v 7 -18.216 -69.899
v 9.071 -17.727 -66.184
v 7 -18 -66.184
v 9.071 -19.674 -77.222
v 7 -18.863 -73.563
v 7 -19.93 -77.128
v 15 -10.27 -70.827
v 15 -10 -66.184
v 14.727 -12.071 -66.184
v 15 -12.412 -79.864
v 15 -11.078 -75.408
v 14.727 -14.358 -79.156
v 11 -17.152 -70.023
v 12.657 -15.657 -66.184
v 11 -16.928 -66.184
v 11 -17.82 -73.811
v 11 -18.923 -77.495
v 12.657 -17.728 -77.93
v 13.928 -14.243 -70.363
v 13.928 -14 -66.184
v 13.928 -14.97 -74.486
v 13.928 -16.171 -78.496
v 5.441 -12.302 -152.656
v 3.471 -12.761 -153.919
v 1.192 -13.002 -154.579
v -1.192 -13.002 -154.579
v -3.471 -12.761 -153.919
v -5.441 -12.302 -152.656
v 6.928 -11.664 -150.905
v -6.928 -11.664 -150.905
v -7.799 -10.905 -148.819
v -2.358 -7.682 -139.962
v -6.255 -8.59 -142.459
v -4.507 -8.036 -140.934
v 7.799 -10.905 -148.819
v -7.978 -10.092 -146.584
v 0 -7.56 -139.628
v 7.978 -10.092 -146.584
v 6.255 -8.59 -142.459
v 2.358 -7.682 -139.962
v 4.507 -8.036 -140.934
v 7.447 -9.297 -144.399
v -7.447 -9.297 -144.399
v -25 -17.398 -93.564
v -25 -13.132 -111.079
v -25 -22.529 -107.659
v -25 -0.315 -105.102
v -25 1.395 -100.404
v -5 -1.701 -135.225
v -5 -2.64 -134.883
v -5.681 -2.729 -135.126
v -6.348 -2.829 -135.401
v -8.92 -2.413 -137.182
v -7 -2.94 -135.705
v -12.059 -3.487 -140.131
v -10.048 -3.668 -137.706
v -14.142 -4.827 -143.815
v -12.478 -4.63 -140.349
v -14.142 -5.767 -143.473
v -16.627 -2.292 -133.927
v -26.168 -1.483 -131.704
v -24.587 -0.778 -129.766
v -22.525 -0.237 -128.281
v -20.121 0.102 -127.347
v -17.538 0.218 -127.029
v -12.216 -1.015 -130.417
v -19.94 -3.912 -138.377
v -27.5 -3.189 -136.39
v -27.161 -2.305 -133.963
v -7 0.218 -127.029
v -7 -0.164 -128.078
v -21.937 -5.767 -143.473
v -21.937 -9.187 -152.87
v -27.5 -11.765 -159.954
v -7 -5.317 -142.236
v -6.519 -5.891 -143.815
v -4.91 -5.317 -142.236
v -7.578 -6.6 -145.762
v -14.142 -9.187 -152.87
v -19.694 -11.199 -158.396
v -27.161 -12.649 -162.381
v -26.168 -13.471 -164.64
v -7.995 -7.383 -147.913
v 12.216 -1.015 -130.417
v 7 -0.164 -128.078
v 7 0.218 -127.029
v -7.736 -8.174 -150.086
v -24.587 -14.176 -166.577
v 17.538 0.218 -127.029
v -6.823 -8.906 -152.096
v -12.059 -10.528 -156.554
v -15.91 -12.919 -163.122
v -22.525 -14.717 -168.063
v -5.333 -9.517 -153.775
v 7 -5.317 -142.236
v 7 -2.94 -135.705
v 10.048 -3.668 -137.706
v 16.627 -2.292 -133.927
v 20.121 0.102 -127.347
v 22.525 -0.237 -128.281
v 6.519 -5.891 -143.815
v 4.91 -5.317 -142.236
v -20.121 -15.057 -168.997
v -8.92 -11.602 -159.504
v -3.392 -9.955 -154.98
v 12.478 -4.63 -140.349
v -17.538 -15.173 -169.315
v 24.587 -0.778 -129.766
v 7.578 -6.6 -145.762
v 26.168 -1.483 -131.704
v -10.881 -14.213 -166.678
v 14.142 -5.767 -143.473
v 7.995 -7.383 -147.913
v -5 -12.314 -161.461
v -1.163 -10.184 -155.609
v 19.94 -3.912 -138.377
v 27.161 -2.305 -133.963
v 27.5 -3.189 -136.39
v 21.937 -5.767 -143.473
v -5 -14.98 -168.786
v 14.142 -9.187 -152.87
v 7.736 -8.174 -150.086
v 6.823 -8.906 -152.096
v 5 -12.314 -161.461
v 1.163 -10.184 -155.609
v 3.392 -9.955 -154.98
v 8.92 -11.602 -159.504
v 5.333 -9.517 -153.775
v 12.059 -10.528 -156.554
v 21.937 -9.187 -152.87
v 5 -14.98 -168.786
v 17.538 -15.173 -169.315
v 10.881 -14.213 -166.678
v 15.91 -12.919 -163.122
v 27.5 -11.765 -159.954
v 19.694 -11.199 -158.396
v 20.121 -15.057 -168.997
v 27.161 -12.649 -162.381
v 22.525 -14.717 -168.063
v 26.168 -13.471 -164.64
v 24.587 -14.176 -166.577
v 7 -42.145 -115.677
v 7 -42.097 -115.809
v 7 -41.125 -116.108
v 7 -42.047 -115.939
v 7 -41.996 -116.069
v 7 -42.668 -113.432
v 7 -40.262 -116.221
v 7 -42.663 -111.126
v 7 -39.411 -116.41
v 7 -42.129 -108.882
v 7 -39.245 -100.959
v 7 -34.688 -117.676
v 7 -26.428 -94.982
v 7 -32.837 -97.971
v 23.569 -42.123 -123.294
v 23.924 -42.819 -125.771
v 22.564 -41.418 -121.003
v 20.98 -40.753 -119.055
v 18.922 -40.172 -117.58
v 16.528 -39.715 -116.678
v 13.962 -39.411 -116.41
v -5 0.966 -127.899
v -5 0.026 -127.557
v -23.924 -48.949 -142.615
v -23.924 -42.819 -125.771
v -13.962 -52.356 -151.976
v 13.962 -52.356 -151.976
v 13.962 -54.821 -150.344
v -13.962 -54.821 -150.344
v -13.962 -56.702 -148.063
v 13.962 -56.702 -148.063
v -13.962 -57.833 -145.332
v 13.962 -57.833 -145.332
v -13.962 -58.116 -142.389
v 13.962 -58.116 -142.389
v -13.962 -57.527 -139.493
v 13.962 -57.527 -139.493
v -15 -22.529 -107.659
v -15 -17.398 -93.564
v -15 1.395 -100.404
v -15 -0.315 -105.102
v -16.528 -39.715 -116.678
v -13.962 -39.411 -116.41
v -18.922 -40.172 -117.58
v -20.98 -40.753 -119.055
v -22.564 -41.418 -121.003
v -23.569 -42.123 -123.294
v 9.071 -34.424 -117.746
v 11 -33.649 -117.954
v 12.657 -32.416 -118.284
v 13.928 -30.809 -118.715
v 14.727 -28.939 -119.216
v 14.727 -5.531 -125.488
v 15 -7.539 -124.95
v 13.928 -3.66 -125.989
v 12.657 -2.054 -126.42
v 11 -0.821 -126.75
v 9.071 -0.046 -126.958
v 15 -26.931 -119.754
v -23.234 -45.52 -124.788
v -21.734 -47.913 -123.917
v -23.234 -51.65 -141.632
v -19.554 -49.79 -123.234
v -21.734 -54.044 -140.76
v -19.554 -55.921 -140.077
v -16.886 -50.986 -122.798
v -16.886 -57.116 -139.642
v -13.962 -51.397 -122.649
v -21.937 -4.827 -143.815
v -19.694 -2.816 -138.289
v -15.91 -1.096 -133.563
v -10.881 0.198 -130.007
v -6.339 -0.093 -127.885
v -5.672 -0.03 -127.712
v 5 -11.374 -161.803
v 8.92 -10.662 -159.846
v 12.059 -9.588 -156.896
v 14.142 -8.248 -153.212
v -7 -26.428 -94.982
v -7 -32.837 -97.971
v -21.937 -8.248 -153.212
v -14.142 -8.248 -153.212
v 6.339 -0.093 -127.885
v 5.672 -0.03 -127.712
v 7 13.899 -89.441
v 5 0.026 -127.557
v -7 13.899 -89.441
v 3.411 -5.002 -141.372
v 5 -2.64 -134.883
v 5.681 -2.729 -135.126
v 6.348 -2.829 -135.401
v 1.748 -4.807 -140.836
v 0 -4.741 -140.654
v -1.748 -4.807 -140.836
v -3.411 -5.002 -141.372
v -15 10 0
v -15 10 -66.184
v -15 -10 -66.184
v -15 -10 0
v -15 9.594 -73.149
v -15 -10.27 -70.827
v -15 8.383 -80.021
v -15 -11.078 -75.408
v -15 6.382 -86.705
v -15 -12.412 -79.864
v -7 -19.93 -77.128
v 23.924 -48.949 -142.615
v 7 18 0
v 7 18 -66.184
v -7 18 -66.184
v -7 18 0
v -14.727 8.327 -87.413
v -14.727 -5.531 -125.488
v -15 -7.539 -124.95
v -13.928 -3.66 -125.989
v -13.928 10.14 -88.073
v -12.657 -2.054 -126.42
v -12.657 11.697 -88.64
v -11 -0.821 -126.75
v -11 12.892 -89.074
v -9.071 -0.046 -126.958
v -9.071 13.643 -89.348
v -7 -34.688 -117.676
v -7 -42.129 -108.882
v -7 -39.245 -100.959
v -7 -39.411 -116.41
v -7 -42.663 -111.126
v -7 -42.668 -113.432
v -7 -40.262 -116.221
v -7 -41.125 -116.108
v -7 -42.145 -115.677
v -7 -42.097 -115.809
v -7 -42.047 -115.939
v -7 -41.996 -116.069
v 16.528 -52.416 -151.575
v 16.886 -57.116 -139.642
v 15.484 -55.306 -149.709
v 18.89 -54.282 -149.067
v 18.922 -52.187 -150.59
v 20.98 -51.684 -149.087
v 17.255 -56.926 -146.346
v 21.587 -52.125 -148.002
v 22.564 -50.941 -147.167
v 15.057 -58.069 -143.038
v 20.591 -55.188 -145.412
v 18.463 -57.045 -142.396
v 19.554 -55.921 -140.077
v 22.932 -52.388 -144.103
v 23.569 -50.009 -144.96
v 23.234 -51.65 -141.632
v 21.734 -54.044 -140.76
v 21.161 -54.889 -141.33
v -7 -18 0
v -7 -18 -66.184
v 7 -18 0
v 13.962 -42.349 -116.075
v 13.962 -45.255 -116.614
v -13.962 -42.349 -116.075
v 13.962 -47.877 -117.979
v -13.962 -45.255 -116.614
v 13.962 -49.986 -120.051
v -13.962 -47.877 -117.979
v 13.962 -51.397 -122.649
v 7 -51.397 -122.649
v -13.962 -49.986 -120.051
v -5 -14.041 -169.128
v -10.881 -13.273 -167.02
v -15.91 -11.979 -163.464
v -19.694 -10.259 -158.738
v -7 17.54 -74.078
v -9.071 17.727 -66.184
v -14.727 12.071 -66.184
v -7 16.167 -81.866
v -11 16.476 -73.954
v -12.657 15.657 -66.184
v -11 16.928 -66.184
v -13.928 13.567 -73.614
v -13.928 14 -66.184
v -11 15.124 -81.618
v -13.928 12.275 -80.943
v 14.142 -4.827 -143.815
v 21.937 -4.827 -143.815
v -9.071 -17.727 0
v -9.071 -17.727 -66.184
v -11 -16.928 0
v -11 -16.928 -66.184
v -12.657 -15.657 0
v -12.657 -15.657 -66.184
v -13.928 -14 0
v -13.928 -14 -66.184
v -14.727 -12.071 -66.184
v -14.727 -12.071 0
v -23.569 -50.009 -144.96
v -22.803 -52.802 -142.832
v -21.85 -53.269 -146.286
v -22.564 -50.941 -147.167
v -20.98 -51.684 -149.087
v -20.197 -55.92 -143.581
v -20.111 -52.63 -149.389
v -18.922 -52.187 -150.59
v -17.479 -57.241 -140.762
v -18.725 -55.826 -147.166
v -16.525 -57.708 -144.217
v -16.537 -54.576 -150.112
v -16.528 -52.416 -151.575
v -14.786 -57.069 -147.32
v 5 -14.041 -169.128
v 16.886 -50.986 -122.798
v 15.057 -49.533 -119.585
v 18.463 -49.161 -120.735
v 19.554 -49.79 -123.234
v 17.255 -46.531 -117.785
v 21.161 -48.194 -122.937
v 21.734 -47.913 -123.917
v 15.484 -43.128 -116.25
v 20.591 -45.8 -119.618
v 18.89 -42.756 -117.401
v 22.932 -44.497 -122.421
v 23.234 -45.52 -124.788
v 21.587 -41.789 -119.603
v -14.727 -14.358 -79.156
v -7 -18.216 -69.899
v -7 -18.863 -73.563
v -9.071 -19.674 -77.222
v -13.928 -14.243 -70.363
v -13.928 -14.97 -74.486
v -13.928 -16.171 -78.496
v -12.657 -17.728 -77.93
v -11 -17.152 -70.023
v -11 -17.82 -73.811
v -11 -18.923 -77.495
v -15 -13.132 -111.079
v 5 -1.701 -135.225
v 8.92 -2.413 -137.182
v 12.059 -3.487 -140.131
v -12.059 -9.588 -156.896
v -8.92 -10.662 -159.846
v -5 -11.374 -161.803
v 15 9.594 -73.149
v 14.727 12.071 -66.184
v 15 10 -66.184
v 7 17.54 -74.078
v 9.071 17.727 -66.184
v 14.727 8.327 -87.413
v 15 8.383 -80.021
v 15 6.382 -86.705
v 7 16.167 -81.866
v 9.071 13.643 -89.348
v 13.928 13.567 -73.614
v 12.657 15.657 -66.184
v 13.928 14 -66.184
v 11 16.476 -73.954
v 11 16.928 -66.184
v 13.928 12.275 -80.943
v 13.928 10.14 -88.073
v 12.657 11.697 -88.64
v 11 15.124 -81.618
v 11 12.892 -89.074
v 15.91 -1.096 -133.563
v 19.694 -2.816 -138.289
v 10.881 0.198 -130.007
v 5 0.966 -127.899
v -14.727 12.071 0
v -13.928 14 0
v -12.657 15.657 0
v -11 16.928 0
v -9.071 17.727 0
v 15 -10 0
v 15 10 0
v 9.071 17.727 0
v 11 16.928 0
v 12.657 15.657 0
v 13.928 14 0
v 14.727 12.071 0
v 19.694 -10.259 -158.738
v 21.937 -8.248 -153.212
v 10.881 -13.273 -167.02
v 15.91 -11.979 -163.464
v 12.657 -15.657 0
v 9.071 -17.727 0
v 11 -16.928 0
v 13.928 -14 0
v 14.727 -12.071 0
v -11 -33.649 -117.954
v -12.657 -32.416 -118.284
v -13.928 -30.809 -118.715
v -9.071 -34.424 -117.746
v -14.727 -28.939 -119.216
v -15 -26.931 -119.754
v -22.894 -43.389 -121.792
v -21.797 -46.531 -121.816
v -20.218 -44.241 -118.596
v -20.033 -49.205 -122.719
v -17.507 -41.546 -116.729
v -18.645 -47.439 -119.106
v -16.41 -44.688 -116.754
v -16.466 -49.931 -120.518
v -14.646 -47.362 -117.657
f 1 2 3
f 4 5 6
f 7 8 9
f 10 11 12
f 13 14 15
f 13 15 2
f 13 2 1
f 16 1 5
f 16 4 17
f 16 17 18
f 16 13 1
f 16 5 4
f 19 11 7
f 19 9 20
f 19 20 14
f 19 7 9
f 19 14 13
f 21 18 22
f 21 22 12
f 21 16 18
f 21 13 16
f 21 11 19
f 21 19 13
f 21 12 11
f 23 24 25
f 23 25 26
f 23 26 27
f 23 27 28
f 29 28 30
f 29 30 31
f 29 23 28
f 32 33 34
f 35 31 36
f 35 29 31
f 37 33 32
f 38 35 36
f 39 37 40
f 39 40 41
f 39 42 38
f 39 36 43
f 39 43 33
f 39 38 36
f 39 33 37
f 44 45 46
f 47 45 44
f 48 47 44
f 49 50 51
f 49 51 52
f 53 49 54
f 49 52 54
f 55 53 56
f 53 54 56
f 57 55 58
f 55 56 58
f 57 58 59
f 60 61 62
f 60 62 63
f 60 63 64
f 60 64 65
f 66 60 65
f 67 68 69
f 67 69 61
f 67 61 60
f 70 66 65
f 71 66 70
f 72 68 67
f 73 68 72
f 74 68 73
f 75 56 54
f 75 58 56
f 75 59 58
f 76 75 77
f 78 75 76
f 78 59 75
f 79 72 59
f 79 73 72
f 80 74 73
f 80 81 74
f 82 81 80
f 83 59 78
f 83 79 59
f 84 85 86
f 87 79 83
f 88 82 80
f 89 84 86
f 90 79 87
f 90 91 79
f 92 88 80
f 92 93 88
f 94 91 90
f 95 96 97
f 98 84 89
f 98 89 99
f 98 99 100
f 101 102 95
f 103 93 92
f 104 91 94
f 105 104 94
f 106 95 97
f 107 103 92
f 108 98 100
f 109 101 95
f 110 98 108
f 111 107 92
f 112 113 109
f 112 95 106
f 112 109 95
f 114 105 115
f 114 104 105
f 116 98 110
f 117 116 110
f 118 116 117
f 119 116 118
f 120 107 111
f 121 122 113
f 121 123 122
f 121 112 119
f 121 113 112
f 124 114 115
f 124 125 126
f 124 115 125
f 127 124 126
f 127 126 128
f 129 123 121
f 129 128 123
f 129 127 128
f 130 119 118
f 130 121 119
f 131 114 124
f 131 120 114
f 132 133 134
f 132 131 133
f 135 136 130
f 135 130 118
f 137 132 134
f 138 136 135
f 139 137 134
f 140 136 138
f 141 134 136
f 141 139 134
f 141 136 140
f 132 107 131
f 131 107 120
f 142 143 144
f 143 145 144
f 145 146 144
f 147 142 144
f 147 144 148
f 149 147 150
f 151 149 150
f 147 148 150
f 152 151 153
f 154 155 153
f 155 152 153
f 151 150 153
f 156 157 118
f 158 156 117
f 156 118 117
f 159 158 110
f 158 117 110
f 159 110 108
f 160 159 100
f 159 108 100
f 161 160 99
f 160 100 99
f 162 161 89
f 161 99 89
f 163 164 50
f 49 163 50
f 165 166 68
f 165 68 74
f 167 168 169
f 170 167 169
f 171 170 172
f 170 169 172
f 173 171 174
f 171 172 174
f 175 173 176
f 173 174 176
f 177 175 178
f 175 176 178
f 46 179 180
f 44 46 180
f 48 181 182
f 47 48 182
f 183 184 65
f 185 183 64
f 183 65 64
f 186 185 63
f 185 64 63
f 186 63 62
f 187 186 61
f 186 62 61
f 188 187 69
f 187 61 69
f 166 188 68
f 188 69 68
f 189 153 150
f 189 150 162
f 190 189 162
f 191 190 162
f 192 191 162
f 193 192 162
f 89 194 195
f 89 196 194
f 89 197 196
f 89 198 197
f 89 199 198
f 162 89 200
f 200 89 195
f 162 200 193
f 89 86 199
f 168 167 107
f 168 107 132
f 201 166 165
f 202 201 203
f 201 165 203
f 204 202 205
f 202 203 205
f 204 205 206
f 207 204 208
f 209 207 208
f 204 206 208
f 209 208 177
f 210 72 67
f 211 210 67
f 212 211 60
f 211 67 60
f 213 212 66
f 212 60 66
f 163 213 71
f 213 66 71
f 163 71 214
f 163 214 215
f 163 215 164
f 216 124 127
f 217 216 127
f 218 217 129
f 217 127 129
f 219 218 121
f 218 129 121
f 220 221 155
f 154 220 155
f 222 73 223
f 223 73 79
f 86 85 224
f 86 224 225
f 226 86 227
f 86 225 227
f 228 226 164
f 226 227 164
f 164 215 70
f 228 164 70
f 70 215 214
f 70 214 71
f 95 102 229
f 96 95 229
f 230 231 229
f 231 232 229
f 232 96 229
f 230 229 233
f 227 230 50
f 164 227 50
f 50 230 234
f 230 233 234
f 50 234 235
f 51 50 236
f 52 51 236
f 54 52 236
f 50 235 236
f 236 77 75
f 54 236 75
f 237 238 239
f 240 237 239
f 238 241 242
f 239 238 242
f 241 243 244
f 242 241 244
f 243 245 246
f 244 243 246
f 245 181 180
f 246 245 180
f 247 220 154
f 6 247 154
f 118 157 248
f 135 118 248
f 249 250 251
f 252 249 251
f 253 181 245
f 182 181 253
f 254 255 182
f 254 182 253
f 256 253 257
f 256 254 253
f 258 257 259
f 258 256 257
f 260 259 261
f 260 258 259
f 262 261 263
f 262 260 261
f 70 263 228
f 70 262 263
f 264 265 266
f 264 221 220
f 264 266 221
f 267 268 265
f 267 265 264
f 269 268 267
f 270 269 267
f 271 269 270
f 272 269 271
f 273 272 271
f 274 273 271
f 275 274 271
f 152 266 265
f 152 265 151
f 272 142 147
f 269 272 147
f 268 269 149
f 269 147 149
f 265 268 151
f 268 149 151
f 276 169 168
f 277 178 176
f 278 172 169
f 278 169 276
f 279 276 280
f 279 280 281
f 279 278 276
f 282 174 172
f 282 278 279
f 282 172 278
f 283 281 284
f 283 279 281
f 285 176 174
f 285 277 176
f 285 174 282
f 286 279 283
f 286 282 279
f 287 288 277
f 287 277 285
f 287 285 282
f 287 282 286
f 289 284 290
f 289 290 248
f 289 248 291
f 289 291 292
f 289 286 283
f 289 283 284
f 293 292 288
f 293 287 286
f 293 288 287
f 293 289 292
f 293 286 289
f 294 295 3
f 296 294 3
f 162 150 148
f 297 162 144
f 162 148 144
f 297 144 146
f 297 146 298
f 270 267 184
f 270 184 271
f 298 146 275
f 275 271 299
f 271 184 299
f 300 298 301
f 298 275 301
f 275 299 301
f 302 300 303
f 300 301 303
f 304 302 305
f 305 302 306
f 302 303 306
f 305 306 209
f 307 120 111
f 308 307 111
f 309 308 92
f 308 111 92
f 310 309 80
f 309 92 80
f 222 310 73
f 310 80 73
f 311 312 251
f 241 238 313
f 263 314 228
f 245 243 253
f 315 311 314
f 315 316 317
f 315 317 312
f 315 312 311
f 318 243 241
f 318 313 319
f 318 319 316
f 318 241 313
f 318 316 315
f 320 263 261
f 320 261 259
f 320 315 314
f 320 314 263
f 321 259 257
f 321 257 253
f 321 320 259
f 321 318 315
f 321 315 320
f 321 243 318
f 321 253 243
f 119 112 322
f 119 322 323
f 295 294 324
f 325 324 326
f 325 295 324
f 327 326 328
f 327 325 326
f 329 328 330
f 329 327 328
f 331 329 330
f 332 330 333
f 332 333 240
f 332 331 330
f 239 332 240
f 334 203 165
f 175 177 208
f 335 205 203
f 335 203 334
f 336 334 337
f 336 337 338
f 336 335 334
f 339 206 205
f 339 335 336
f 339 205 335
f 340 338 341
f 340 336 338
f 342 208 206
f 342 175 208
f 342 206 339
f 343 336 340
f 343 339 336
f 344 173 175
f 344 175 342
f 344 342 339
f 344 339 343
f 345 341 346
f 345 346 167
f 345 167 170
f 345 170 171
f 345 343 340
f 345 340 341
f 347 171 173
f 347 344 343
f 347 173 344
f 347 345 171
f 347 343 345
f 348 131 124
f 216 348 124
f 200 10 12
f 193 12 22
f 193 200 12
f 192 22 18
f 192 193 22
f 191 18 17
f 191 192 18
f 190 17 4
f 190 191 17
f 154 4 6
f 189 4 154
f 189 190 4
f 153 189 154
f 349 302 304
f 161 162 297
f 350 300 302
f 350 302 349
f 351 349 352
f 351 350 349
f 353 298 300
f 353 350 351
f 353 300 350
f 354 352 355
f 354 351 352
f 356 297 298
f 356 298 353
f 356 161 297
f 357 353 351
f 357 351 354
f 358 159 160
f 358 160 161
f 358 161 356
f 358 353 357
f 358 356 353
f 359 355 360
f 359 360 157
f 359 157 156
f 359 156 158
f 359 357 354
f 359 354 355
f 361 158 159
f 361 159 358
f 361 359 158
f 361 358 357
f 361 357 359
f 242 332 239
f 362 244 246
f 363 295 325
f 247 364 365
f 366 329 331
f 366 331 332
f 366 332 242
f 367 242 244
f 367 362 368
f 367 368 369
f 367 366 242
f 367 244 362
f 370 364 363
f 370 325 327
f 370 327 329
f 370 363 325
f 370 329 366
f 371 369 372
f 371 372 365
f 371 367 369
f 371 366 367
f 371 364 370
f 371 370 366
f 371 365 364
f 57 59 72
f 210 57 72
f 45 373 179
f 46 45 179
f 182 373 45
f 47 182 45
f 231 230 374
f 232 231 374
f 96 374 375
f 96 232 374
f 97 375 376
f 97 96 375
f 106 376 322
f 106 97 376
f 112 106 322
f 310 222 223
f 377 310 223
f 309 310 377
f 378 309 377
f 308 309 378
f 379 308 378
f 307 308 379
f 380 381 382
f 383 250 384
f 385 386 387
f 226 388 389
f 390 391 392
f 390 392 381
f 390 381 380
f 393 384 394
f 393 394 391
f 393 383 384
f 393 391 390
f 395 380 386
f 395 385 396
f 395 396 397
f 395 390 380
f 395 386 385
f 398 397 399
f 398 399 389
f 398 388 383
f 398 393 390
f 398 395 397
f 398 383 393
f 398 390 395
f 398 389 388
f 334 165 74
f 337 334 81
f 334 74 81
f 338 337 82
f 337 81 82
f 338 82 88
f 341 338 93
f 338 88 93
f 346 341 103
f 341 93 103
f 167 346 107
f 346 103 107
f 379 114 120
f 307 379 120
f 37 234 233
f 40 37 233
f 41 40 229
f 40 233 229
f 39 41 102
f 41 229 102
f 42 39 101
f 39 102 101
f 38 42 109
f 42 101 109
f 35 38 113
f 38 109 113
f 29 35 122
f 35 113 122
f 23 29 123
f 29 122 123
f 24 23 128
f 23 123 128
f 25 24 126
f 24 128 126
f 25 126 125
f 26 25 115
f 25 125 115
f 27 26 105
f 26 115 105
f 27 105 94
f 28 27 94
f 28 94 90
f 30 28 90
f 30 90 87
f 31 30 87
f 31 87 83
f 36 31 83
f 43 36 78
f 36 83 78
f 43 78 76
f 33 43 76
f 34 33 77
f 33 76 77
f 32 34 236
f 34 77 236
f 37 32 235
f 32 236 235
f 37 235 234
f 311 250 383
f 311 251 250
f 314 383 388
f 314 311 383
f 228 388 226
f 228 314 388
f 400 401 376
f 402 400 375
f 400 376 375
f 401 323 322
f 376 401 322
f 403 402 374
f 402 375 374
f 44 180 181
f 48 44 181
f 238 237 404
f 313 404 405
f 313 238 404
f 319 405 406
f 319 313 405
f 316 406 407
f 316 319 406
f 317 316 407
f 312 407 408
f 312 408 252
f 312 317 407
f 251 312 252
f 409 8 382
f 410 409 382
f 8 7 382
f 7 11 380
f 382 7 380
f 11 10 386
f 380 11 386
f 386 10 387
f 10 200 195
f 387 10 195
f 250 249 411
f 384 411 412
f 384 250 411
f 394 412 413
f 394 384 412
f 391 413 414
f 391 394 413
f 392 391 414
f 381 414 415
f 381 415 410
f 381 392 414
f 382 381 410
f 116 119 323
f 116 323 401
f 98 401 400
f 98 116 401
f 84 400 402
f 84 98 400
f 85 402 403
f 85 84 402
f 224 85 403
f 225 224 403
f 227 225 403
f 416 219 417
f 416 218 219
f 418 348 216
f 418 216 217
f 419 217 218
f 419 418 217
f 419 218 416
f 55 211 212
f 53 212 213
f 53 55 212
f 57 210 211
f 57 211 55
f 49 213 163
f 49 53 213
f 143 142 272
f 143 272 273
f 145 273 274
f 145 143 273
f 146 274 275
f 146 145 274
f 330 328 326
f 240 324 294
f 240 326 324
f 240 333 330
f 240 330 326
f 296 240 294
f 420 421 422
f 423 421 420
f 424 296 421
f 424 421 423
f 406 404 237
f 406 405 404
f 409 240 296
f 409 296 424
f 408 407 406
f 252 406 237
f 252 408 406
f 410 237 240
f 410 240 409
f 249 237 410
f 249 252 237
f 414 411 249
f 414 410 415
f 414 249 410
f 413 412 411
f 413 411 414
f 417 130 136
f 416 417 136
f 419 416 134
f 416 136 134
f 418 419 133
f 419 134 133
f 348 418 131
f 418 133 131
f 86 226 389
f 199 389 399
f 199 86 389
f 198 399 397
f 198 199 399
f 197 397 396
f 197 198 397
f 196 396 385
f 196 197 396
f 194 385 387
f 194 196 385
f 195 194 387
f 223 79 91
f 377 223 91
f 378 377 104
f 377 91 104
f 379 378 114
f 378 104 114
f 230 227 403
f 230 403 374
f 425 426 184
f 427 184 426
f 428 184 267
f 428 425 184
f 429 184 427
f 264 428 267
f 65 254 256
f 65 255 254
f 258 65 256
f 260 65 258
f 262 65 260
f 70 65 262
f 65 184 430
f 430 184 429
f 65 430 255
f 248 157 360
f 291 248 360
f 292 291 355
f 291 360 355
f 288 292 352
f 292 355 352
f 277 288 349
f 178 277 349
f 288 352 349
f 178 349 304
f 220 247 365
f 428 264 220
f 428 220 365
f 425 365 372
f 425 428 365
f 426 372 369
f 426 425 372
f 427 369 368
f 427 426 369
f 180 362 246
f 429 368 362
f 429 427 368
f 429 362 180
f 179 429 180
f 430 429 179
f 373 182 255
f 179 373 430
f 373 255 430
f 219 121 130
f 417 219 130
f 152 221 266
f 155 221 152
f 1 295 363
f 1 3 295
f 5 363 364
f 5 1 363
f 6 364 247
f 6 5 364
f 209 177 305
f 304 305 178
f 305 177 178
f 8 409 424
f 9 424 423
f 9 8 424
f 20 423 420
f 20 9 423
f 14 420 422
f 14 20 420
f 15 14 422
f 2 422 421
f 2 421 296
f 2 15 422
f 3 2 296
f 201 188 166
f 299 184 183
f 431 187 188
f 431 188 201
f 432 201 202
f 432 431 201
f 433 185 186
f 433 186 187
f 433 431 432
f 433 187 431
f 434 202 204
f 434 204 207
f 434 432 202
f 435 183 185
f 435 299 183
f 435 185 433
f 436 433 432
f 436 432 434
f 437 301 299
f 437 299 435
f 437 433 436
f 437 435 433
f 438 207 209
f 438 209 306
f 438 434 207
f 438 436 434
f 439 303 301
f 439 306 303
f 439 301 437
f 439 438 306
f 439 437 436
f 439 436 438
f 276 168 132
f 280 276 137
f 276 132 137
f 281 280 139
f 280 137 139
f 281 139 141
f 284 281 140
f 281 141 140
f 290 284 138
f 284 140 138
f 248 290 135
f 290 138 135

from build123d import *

# Parameters (mm, degrees)
SKETCH3_W           = 14
SKETCH3_H           = 28
BOSS_EXTRUDE1_DEPTH = 10
CHAMFER1_SIZE       = 5
SKETCH4_W           = 14
SKETCH4_H           = 10
CUT_EXTRUDE1_DEPTH  = 5
FILLET1_R           = 10
FILLET2_R           = 10
SKETCH5_W           = 55
SKETCH5_H           = 45
BOSS_EXTRUDE2_DEPTH = 50
BOSS_EXTRUDE2_DRAFT = -5
BOSS_EXTRUDE3_DEPTH = 10
CHAMFER2_SIZE       = 10
SKETCH7_R           = 8
CUT_EXTRUDE2_DEPTH  = 3
BOSS_EXTRUDE4_DEPTH = 1
FILLET3_R           = 10


# Some blends are built 0.0001 mm under size
with BuildPart() as part:
    # Sweep1: sweep along a path in Sketch2
    with BuildLine(Plane(origin=(0, 0, 0), x_dir=(0, 0, -1), z_dir=(1, 0, 0))) as sweep1_path:
        Line((0, 0), (66.183650965, 0))
        ThreePointArc((66.183650965, 0), (74.866059848, -0.759612349), (83.284658131, -3.015368961))
        Line((83.284658131, -3.015368961), (136.080020351, -22.231309316))
    # Sketch1 → Sweep1 (sweep)
    with BuildSketch(Plane.XY):
        with BuildLine():
            Line((7, -18), (-7, -18))
            ThreePointArc((-7, -18), (-12.656854249, -15.656854249), (-15, -10))
            Line((-15, -10), (-15, 10))
            ThreePointArc((-15, 10), (-12.656854249, 15.656854249), (-7, 18))
            Line((-7, 18), (7, 18))
            ThreePointArc((7, 18), (12.656854249, 15.656854249), (15, 10))
            Line((15, 10), (15, -10))
            ThreePointArc((15, -10), (12.656854249, -15.656854249), (7, -18))
        make_face()
    sweep(path=sweep1_path.line)

    # Sketch3 → Boss-Extrude1 (add)
    with BuildSketch(Plane(origin=(0, 7.190068189, -2.616970803), x_dir=(1, 0, 0), z_dir=(0, -0.939692620785908, 0.3420201433256697))):
        with Locations((0, -117.293295594)):
            Rectangle(SKETCH3_W, SKETCH3_H)
    extrude(amount=BOSS_EXTRUDE1_DEPTH)

    # Chamfer1
    chamfer1_edges = [part.edges().sort_by_distance(p)[0] for p in [
        (0, -28.138319575, -99.68091845),
    ]]
    chamfer(chamfer1_edges, length=CHAMFER1_SIZE)
    chamfer1_2_edges = [part.edges().sort_by_distance(p)[0] for p in [
        (0, -37.535245783, -96.260717017),
    ]]
    chamfer(chamfer1_2_edges, length=CHAMFER1_SIZE - 0.0001)  # a hair under: the kernel refuses the full size

    # Sketch4 → Cut-Extrude1 (cut)
    with BuildSketch(Plane(origin=(0, -2.206858019, 0.80323063), x_dir=(1, 0, 0), z_dir=(0, -0.9396926207859079, 0.34202014332567005))):
        with Locations((0, -126.293295594)):
            Rectangle(SKETCH4_W, SKETCH4_H)
    extrude(amount=-CUT_EXTRUDE1_DEPTH, mode=Mode.SUBTRACT)

    # Fillet1
    # the kernel refuses this fillet: 10 mm, written as the material it adds along each edge
    with BuildSketch(Plane(origin=(-7, -38.993145258, -114.885284907), x_dir=(0, -0.9396926207859382, 0.34202014332558694), z_dir=(1, 0, 0))) as fillet1_piece_1:
        with BuildLine():
            CenterArc((10, 8.660254038), FILLET1_R, 180, 60)
            Line((0, 8.660254038), (-0.2, 8.660254038))
            Line((-0.2, 8.660254038), (-0.2, 0))
            Line((-0.2, 0), (0, -0.2))
            ThreePointArc((0, -0.2), (2.5, -0.2), (4.9, -0.173205081))
            Line((4.9, -0.173205081), (5, 0))
        make_face()
    extrude(amount=14)

    # Fillet2
    fillet2_edges = [part.edges().sort_by_distance(p)[0] for p in [
        (0, -43.691608362, -113.175184191),
    ]]
    fillet(fillet2_edges, radius=FILLET2_R)


with BuildPart() as boss_extrude2_tool:
    # Sketch5 → Boss-Extrude2 (with draft: the straight prism first)
    with BuildSketch(Plane(origin=(0, 41.019002537, -14.929695963), x_dir=(1, 0, 0), z_dir=(0, 0.939692620785908, -0.34202014332566977))):
        with Locations((0, 141.793295594)):
            Rectangle(SKETCH5_W, SKETCH5_H)
    extrude(amount=-BOSS_EXTRUDE2_DEPTH)
    # Boss-Extrude2: the draft: its side faces are tilted about the plane it starts from
    boss_extrude2_sides = [boss_extrude2_tool.faces().sort_by_distance(p)[0] for p in [
        (0, -38.664929489, -160.764389894),
        (-27.5, -30.969476264, -139.621305927),
        (0, -23.274023039, -118.478221959),
        (27.5, -30.969476264, -139.621305927),
    ]]
    draft(boss_extrude2_sides, Plane(origin=(0, 41.019002537, -14.929695963), x_dir=(1, 0, 0), z_dir=(0, 0.939692620785908, -0.34202014332566977)), BOSS_EXTRUDE2_DRAFT)


with BuildPart() as part_1:
    add(part.part)

    # Boss-Extrude2: add boss_extrude2_tool
    add(boss_extrude2_tool.part)

    # Sketch6 → Boss-Extrude3 (add)
    with BuildSketch(Plane.ZY.offset(15)):
        Polygon((-107.658933731, -22.528657486), (-93.563544419, -17.398355336), (-100.403947286, 1.39549708), (-114.499336598, -3.73480507), align=None)
    extrude(amount=BOSS_EXTRUDE3_DEPTH)

    # Chamfer2
    chamfer2_edges = [part_1.edges().sort_by_distance(p)[0] for p in [
        (-20, -3.73480507, -114.499336598),
    ]]
    chamfer(chamfer2_edges, length=CHAMFER2_SIZE)

    # Sketch7 → Cut-Extrude2 (cut)
    with BuildSketch(Plane(origin=(0, 41.019002537, -14.929695963), x_dir=(1, 0, 0), z_dir=(0, 0.9396926207859081, -0.3420201433256698))):
        with Locations(Location((0, 141.793295594, 0), (0, 0, 270))):
            Circle(SKETCH7_R)
    extrude(amount=-CUT_EXTRUDE2_DEPTH, mode=Mode.SUBTRACT)

    # Sketch10 → Boss-Extrude4 (add)
    with BuildSketch(Plane(origin=(0, 41.019002537, -14.929695963), x_dir=(1, 0, 0), z_dir=(0, 0.9396926207859081, -0.3420201433256698))):
        with BuildLine():
            Line((14.142135624, 136.793295594), (21.937410968, 136.793295594))
            ThreePointArc((21.937410968, 136.793295594), (15.909902577, 125.883393018), (5, 119.855884626))
            Line((5, 119.855884626), (5, 127.651159971))
            ThreePointArc((5, 127.651159971), (10.606601718, 131.186693877), (14.142135624, 136.793295594))
        make_face()
        with BuildLine():
            Line((-5, 119.855884626), (-5, 127.651159971))
            ThreePointArc((-5, 127.651159971), (-10.606601718, 131.186693877), (-14.142135624, 136.793295594))
            Line((-14.142135624, 136.793295594), (-21.937410968, 136.793295594))
            ThreePointArc((-21.937410968, 136.793295594), (-15.909902577, 125.883393018), (-5, 119.855884626))
        make_face()
        with BuildLine():
            Line((-21.937410968, 146.793295594), (-14.142135624, 146.793295594))
            ThreePointArc((-14.142135624, 146.793295594), (-10.606601718, 152.399897312), (-5, 155.935431218))
            Line((-5, 155.935431218), (-5, 163.730706563))
            ThreePointArc((-5, 163.730706563), (-15.909902577, 157.703198171), (-21.937410968, 146.793295594))
        make_face()
        with BuildLine():
            Line((14.142135624, 146.793295594), (21.937410968, 146.793295594))
            ThreePointArc((21.937410968, 146.793295594), (15.909902577, 157.703198171), (5, 163.730706563))
            Line((5, 163.730706563), (5, 155.935431218))
            ThreePointArc((5, 155.935431218), (10.606601718, 152.399897312), (14.142135624, 146.793295594))
        make_face()
    extrude(amount=BOSS_EXTRUDE4_DEPTH)

    # Fillet3
    # the kernel refuses this fillet: 10 mm, written as the material it takes off along each edge
    with BuildSketch(Plane(origin=(13.962255084, -48.130137344, -142.912768744), x_dir=(-0.05900350758284425, -0.38201671186492897, 0.9222699268374899), z_dir=(0.5431604763459367, -0.7874344840965063, -0.2914165921688819))) as fillet3_piece_1_section:
        Polygon((-19.642374915, -19.642374915), (19.642374915, -19.642374915), (19.642374915, 19.642374915), (-19.642374915, 19.642374915), align=None)
    fillet3_piece_1 = extrude(amount=19.642374915, mode=Mode.PRIVATE)
    fillet3_piece_1 = split(fillet3_piece_1, bisect_by=Plane(origin=(13.962255084, -48.130137344, -142.912768744), z_dir=(-0.0868265938642479, -0.9028850613880008, 0.42102221855897237)), keep=Keep.TOP, mode=Mode.PRIVATE)
    fillet3_piece_1 = split(fillet3_piece_1, bisect_by=Plane(origin=(13.962255084, -48.130137344, -142.912768744), z_dir=(1, 0, 0)), keep=Keep.TOP, mode=Mode.PRIVATE)
    fillet3_piece_1 = split(fillet3_piece_1, bisect_by=Plane(origin=(13.962255084, -48.130137344, -142.912768744), z_dir=(0, -0.34202014332566977, -0.939692620785908)), keep=Keep.TOP, mode=Mode.PRIVATE)
    fillet3_piece_1 = split(fillet3_piece_1, bisect_by=Plane(origin=(23.924202064, -48.949133427, -142.614678548), z_dir=(-0.9961946980917455, 0.08189960831908964, -0.02980901962620929)), keep=Keep.TOP, mode=Mode.PRIVATE)
    fillet3_piece_1 = split(fillet3_piece_1, bisect_by=Plane(origin=(13.962255084, -52.356319961, -151.975846615), z_dir=(0, 0.4226182617407007, 0.9063077870366494)), keep=Keep.TOP, mode=Mode.PRIVATE)
    fillet3_piece_1 = split(fillet3_piece_1, bisect_by=Plane(origin=(13.962255084, -57.527063552, -139.492567311), z_dir=(0, 0.939692620785908, -0.34202014332566977)), keep=Keep.TOP, mode=Mode.PRIVATE)
    fillet3_piece_1 = fillet3_piece_1 - Plane(origin=(13.962255084, -48.130137344, -142.912768744), x_dir=(-0.5431604763459367, 0.7874344840965063, 0.2914165921688819), z_dir=(-0.05900350758284425, -0.38201671186492897, 0.9222699268374899)) * Sphere(FILLET3_R, mode=Mode.PRIVATE)
    add(fillet3_piece_1, mode=Mode.SUBTRACT)
    with BuildSketch(Plane(origin=(-13.962255084, -48.130137344, -142.912768744), x_dir=(0.7359928340771044, -0.6135606983424445, 0.28610805238001186), z_dir=(-0.5431604763459367, -0.7874344840965063, -0.2914165921688819))) as fillet3_piece_2_section:
        Polygon((-19.642374915, -19.642374915), (19.642374915, -19.642374915), (19.642374915, 19.642374915), (-19.642374915, 19.642374915), align=None)
    fillet3_piece_2 = extrude(amount=19.642374915, mode=Mode.PRIVATE)
    fillet3_piece_2 = split(fillet3_piece_2, bisect_by=Plane(origin=(-13.962255084, -48.130137344, -142.912768744), z_dir=(-1, 0, 0)), keep=Keep.TOP, mode=Mode.PRIVATE)
    fillet3_piece_2 = split(fillet3_piece_2, bisect_by=Plane(origin=(-13.962255084, -48.130137344, -142.912768744), z_dir=(0, -0.34202014332566977, -0.939692620785908)), keep=Keep.TOP, mode=Mode.PRIVATE)
    fillet3_piece_2 = split(fillet3_piece_2, bisect_by=Plane(origin=(-13.962255084, -48.130137344, -142.912768744), z_dir=(0.0868265938642479, -0.9028850613880008, 0.42102221855897237)), keep=Keep.TOP, mode=Mode.PRIVATE)
    fillet3_piece_2 = split(fillet3_piece_2, bisect_by=Plane(origin=(-13.962255084, -52.356319961, -151.975846615), z_dir=(0, 0.4226182617407007, 0.9063077870366494)), keep=Keep.TOP, mode=Mode.PRIVATE)
    fillet3_piece_2 = split(fillet3_piece_2, bisect_by=Plane(origin=(-13.962255084, -57.527063552, -139.492567311), z_dir=(0, 0.939692620785908, -0.34202014332566977)), keep=Keep.TOP, mode=Mode.PRIVATE)
    fillet3_piece_2 = split(fillet3_piece_2, bisect_by=Plane(origin=(-23.924202064, -48.949133427, -142.614678548), z_dir=(0.9961946980917455, 0.08189960831908964, -0.02980901962620929)), keep=Keep.TOP, mode=Mode.PRIVATE)
    fillet3_piece_2 = fillet3_piece_2 - Plane(origin=(-13.962255084, -48.130137344, -142.912768744), x_dir=(0.5431604763459367, 0.7874344840965063, 0.2914165921688819), z_dir=(0.7359928340771044, -0.6135606983424445, 0.28610805238001186)) * Sphere(FILLET3_R, mode=Mode.PRIVATE)
    add(fillet3_piece_2, mode=Mode.SUBTRACT)
    with BuildSketch(Plane(origin=(-13.962255084, -41.999593808, -126.069238809), x_dir=(0.7071067811865476, 0.241844762647976, 0.6644630243886744), z_dir=(-0.5431604763459366, -0.4158908361591537, 0.7293911908807889))) as fillet3_piece_3_section:
        Polygon((-19.642374915, -19.642374915), (19.642374915, -19.642374915), (19.642374915, 19.642374915), (-19.642374915, 19.642374915), align=None)
    fillet3_piece_3 = extrude(amount=19.642374915, mode=Mode.PRIVATE)
    fillet3_piece_3 = split(fillet3_piece_3, bisect_by=Plane(origin=(-13.962255084, -41.999593808, -126.069238809), z_dir=(0, 0.34202014332566977, 0.939692620785908)), keep=Keep.TOP, mode=Mode.PRIVATE)
    fillet3_piece_3 = split(fillet3_piece_3, bisect_by=Plane(origin=(-13.962255084, -41.999593808, -126.069238809), z_dir=(0.08682659386424792, -0.9622779495438604, 0.2578415994745548)), keep=Keep.TOP, mode=Mode.PRIVATE)
    fillet3_piece_3 = split(fillet3_piece_3, bisect_by=Plane(origin=(-13.962255084, -41.999593808, -126.069238809), z_dir=(-1, 0, 0)), keep=Keep.TOP, mode=Mode.PRIVATE)
    fillet3_piece_3 = split(fillet3_piece_3, bisect_by=Plane(origin=(-13.962255084, -51.396520016, -122.649037376), z_dir=(0, 0.939692620785908, -0.34202014332566977)), keep=Keep.TOP, mode=Mode.PRIVATE)
    fillet3_piece_3 = split(fillet3_piece_3, bisect_by=Plane(origin=(-23.924202064, -42.818589891, -125.771148613), z_dir=(0.9961946980917455, 0.08189960831908964, -0.02980901962620929)), keep=Keep.TOP, mode=Mode.PRIVATE)
    fillet3_piece_3 = split(fillet3_piece_3, bisect_by=Plane(origin=(-13.962255084, -39.411403357, -116.409980546), z_dir=(0, -0.2588190451025215, -0.9659258262890682)), keep=Keep.TOP, mode=Mode.PRIVATE)
    fillet3_piece_3 = fillet3_piece_3 - Plane(origin=(-13.962255084, -41.999593808, -126.069238809), x_dir=(0.5431604763459366, 0.4158908361591537, -0.7293911908807889), z_dir=(0.7071067811865476, 0.241844762647976, 0.6644630243886744)) * Sphere(FILLET3_R, mode=Mode.PRIVATE)
    add(fillet3_piece_3, mode=Mode.SUBTRACT)
    with BuildSketch(Plane(origin=(13.962255084, -41.999593808, -126.069238809), x_dir=(0.05900350758284439, 0.8854654610603633, 0.46094414342963447), z_dir=(0.5431604763459366, -0.4158908361591537, 0.7293911908807889))) as fillet3_piece_4_section:
        Polygon((-19.642374915, -19.642374915), (19.642374915, -19.642374915), (19.642374915, 19.642374915), (-19.642374915, 19.642374915), align=None)
    fillet3_piece_4 = extrude(amount=19.642374915, mode=Mode.PRIVATE)
    fillet3_piece_4 = split(fillet3_piece_4, bisect_by=Plane(origin=(13.962255084, -41.999593808, -126.069238809), z_dir=(0, 0.34202014332566977, 0.939692620785908)), keep=Keep.TOP, mode=Mode.PRIVATE)
    fillet3_piece_4 = split(fillet3_piece_4, bisect_by=Plane(origin=(13.962255084, -41.999593808, -126.069238809), z_dir=(1, 0, 0)), keep=Keep.TOP, mode=Mode.PRIVATE)
    fillet3_piece_4 = split(fillet3_piece_4, bisect_by=Plane(origin=(13.962255084, -41.999593808, -126.069238809), z_dir=(-0.08682659386424792, -0.9622779495438604, 0.2578415994745548)), keep=Keep.TOP, mode=Mode.PRIVATE)
    fillet3_piece_4 = split(fillet3_piece_4, bisect_by=Plane(origin=(23.924202064, -42.818589891, -125.771148613), z_dir=(-0.9961946980917455, 0.08189960831908964, -0.02980901962620929)), keep=Keep.TOP, mode=Mode.PRIVATE)
    fillet3_piece_4 = split(fillet3_piece_4, bisect_by=Plane(origin=(13.962255084, -51.396520016, -122.649037376), z_dir=(0, 0.939692620785908, -0.34202014332566977)), keep=Keep.TOP, mode=Mode.PRIVATE)
    fillet3_piece_4 = split(fillet3_piece_4, bisect_by=Plane(origin=(13.962255084, -39.411403357, -116.409980546), z_dir=(0, -0.2588190451025215, -0.9659258262890682)), keep=Keep.TOP, mode=Mode.PRIVATE)
    fillet3_piece_4 = fillet3_piece_4 - Plane(origin=(13.962255084, -41.999593808, -126.069238809), x_dir=(-0.5431604763459366, 0.4158908361591537, -0.7293911908807889), z_dir=(0.05900350758284439, 0.8854654610603633, 0.46094414342963447)) * Sphere(FILLET3_R, mode=Mode.PRIVATE)
    add(fillet3_piece_4, mode=Mode.SUBTRACT)
    with BuildSketch(Plane(origin=(13.962255084, -60.661100747, -148.103263735), x_dir=(0, 0.9063077870366486, -0.4226182617407022), z_dir=(-1, 0, 0))) as fillet3_piece_5:
        with BuildLine():
            CenterArc((FILLET3_R * 0.916331174017, -FILLET3_R), FILLET3_R, 90, 85)
            Line((-FILLET3_R * 0.0798635240743, -FILLET3_R * 0.912844257252), (0, 0))
            Line((0, 0), (FILLET3_R * 0.916331174017, 0))
        make_face()
    extrude(amount=27.924510167, mode=Mode.SUBTRACT)
    with BuildSketch(Plane(origin=(-23.125566824, -57.527063552, -139.492567311), x_dir=(-0.08715574274765854, 0.9361168066628587, -0.3407186534216111), z_dir=(0, 0.34202014332566977, 0.939692620785908)), Plane(origin=(23.125566824, -51.396520016, -122.649037376), x_dir=(0.08715574274765832, 0.9361168066628587, -0.3407186534216111), z_dir=(0, -0.34202014332566977, -0.939692620785908))) as fillet3_piece_6:
        with BuildLine():
            CenterArc((FILLET3_R * 0.916331174017, -FILLET3_R), FILLET3_R, 90, 85)
            Line((-FILLET3_R * 0.0798635240743, -FILLET3_R * 0.912844257252), (0, 0))
            Line((0, 0), (FILLET3_R * 0.916331174017, 0))
        make_face()
    extrude(amount=17.924510167, mode=Mode.SUBTRACT)
    with BuildSketch(Plane(origin=(-13.962255084, -48.262482821, -114.038340952), x_dir=(0, 0.9659258262890681, -0.2588190451025217), z_dir=(1, 0, 0))) as fillet3_piece_7_section:
        with BuildLine():
            CenterArc((FILLET3_R * 0.916331174017, -FILLET3_R), FILLET3_R, 90, 85)
            Line((-FILLET3_R * 0.0798635240743, -FILLET3_R * 0.912844257252), (0, 0))
            Line((0, 0), (FILLET3_R * 0.916331174017, 0))
        make_face()
    fillet3_piece_7 = extrude(amount=27.924510167, mode=Mode.PRIVATE)
    fillet3_piece_7 = split(fillet3_piece_7, bisect_by=Plane(origin=(-7, -48.262482821, -114.038340952), z_dir=(-1, 0, 0)), keep=Keep.TOP, mode=Mode.PRIVATE)
    fillet3_piece_7 = fillet3_piece_7 & Plane(origin=(-13.962255084, -32.732162269, -112.30239752), x_dir=(0, -0.9309945262431326, -0.36503313836599144), z_dir=(1, 0, 0)) * Cylinder(10, 93, mode=Mode.PRIVATE)
    add(fillet3_piece_7, mode=Mode.SUBTRACT)
    with BuildSketch(Plane(origin=(-13.962255084, -48.262482821, -114.038340952), x_dir=(0, 0.9659258262890681, -0.2588190451025217), z_dir=(1, 0, 0))) as fillet3_piece_8_section:
        with BuildLine():
            CenterArc((FILLET3_R * 0.916331174017, -FILLET3_R), FILLET3_R, 90, 85)
            Line((-FILLET3_R * 0.0798635240743, -FILLET3_R * 0.912844257252), (0, 0))
            Line((0, 0), (FILLET3_R * 0.916331174017, 0))
        make_face()
    fillet3_piece_8 = extrude(amount=27.924510167, mode=Mode.PRIVATE)
    fillet3_piece_8 = split(fillet3_piece_8, bisect_by=Plane(origin=(-7, -48.262482821, -114.038340952), z_dir=(-1, 0, 0)), keep=Keep.TOP, mode=Mode.PRIVATE)
    fillet3_piece_8 = fillet3_piece_8 - Plane(origin=(-13.962255084, -32.732162269, -112.30239752), x_dir=(0, -0.9309945262431326, -0.36503313836599144), z_dir=(1, 0, 0)) * Cylinder(10, 93, mode=Mode.PRIVATE)
    add(fillet3_piece_8, mode=Mode.SUBTRACT)
    with BuildSketch(Plane(origin=(-13.962255084, -48.262482821, -114.038340952), x_dir=(0, 0.9659258262890681, -0.2588190451025217), z_dir=(1, 0, 0))) as fillet3_piece_9_section:
        with BuildLine():
            CenterArc((FILLET3_R * 0.916331174017, -FILLET3_R), FILLET3_R, 90, 85)
            Line((-FILLET3_R * 0.0798635240743, -FILLET3_R * 0.912844257252), (0, 0))
            Line((0, 0), (FILLET3_R * 0.916331174017, 0))
        make_face()
    fillet3_piece_9 = extrude(amount=27.924510167, mode=Mode.PRIVATE)
    fillet3_piece_9 = split(fillet3_piece_9, bisect_by=Plane(origin=(-7, -48.262482821, -114.038340952), z_dir=(1, 0, 0)), keep=Keep.TOP, mode=Mode.PRIVATE)
    fillet3_piece_9 = fillet3_piece_9 - Plane(origin=(-13.962255084, -32.732162269, -112.30239752), x_dir=(0, -0.9309945262431326, -0.36503313836599144), z_dir=(1, 0, 0)) * Cylinder(10, 93, mode=Mode.PRIVATE)
    fillet3_piece_9 = split(fillet3_piece_9, bisect_by=Plane(origin=(7, -48.262482821, -114.038340952), z_dir=(-1, 0, 0)), keep=Keep.TOP, mode=Mode.PRIVATE)
    add(fillet3_piece_9, mode=Mode.SUBTRACT)
    with BuildSketch(Plane(origin=(-13.962255084, -48.262482821, -114.038340952), x_dir=(0, 0.9659258262890681, -0.2588190451025217), z_dir=(1, 0, 0))) as fillet3_piece_10_section:
        with BuildLine():
            CenterArc((FILLET3_R * 0.916331174017, -FILLET3_R), FILLET3_R, 90, 85)
            Line((-FILLET3_R * 0.0798635240743, -FILLET3_R * 0.912844257252), (0, 0))
            Line((0, 0), (FILLET3_R * 0.916331174017, 0))
        make_face()
    fillet3_piece_10 = extrude(amount=27.924510167, mode=Mode.PRIVATE)
    fillet3_piece_10 = fillet3_piece_10 & Plane(origin=(-13.962255084, -32.732162269, -112.30239752), x_dir=(0, -0.9309945262431326, -0.36503313836599144), z_dir=(1, 0, 0)) * Cylinder(10, 93, mode=Mode.PRIVATE)
    fillet3_piece_10 = split(fillet3_piece_10, bisect_by=Plane(origin=(7, -48.262482821, -114.038340952), z_dir=(1, 0, 0)), keep=Keep.TOP, mode=Mode.PRIVATE)
    add(fillet3_piece_10, mode=Mode.SUBTRACT)
    with BuildSketch(Plane(origin=(-13.962255084, -48.262482821, -114.038340952), x_dir=(0, 0.9659258262890681, -0.2588190451025217), z_dir=(1, 0, 0))) as fillet3_piece_11_section:
        with BuildLine():
            CenterArc((FILLET3_R * 0.916331174017, -FILLET3_R), FILLET3_R, 90, 85)
            Line((-FILLET3_R * 0.0798635240743, -FILLET3_R * 0.912844257252), (0, 0))
            Line((0, 0), (FILLET3_R * 0.916331174017, 0))
        make_face()
    fillet3_piece_11 = extrude(amount=27.924510167, mode=Mode.PRIVATE)
    fillet3_piece_11 = fillet3_piece_11 - Plane(origin=(-13.962255084, -32.732162269, -112.30239752), x_dir=(0, -0.9309945262431326, -0.36503313836599144), z_dir=(1, 0, 0)) * Cylinder(10, 93, mode=Mode.PRIVATE)
    fillet3_piece_11 = split(fillet3_piece_11, bisect_by=Plane(origin=(7, -48.262482821, -114.038340952), z_dir=(1, 0, 0)), keep=Keep.TOP, mode=Mode.PRIVATE)
    add(fillet3_piece_11, mode=Mode.SUBTRACT)
    with BuildSketch(Plane(origin=(29.65423836, 7.228698204, -179.760796897), x_dir=(0.007567436278487963, 0.4220083175478485, 0.906560375170129), z_dir=(-0.08682659386424792, -0.9028850613880008, 0.42102221855897237)), Plane(origin=(29.65423836, 24.093190479, -133.42598518), x_dir=(-0.9962234400966145, 0.08386804942218848, -0.022472376113451063), z_dir=(-0.08682659386424793, -0.9622779495438604, 0.2578415994745548)), Plane(origin=(-29.65423836, 7.228698204, -179.760796897), x_dir=(0.9962234400966147, 0.07869161814103695, -0.036694504171773175), z_dir=(0.08682659386424792, -0.9028850613880008, 0.42102221855897237))) as fillet3_piece_12:
        with BuildLine():
            CenterArc((FILLET3_R * 0.992432509139, FILLET3_R), FILLET3_R, 180.435230002, 89.564769998)
            Line((-FILLET3_R * 0.00753863989878, FILLET3_R * 0.992403876506), (0, 0))
            Line((0, 0), (FILLET3_R * 0.992432509139, 0))
        make_face()
    extrude(amount=66.858985653, mode=Mode.SUBTRACT)
    with BuildSketch(Plane(origin=(-29.65423836, 24.093190479, -133.42598518), x_dir=(0.9962234400966145, 0.08386804942218848, -0.022472376113451063), z_dir=(0.08682659386424793, -0.9622779495438604, 0.2578415994745548))) as fillet3_piece_13:
        with BuildLine():
            CenterArc((FILLET3_R * 0.992432509139, -FILLET3_R), FILLET3_R, 90, 89.564769998)
            Line((-FILLET3_R * 0.00753863989877, -FILLET3_R * 0.992403876506), (0, 0))
            Line((0, 0), (FILLET3_R * 0.992432509139, 0))
        make_face()
    extrude(amount=66.858985653, mode=Mode.SUBTRACT)


solid = part_1.part
